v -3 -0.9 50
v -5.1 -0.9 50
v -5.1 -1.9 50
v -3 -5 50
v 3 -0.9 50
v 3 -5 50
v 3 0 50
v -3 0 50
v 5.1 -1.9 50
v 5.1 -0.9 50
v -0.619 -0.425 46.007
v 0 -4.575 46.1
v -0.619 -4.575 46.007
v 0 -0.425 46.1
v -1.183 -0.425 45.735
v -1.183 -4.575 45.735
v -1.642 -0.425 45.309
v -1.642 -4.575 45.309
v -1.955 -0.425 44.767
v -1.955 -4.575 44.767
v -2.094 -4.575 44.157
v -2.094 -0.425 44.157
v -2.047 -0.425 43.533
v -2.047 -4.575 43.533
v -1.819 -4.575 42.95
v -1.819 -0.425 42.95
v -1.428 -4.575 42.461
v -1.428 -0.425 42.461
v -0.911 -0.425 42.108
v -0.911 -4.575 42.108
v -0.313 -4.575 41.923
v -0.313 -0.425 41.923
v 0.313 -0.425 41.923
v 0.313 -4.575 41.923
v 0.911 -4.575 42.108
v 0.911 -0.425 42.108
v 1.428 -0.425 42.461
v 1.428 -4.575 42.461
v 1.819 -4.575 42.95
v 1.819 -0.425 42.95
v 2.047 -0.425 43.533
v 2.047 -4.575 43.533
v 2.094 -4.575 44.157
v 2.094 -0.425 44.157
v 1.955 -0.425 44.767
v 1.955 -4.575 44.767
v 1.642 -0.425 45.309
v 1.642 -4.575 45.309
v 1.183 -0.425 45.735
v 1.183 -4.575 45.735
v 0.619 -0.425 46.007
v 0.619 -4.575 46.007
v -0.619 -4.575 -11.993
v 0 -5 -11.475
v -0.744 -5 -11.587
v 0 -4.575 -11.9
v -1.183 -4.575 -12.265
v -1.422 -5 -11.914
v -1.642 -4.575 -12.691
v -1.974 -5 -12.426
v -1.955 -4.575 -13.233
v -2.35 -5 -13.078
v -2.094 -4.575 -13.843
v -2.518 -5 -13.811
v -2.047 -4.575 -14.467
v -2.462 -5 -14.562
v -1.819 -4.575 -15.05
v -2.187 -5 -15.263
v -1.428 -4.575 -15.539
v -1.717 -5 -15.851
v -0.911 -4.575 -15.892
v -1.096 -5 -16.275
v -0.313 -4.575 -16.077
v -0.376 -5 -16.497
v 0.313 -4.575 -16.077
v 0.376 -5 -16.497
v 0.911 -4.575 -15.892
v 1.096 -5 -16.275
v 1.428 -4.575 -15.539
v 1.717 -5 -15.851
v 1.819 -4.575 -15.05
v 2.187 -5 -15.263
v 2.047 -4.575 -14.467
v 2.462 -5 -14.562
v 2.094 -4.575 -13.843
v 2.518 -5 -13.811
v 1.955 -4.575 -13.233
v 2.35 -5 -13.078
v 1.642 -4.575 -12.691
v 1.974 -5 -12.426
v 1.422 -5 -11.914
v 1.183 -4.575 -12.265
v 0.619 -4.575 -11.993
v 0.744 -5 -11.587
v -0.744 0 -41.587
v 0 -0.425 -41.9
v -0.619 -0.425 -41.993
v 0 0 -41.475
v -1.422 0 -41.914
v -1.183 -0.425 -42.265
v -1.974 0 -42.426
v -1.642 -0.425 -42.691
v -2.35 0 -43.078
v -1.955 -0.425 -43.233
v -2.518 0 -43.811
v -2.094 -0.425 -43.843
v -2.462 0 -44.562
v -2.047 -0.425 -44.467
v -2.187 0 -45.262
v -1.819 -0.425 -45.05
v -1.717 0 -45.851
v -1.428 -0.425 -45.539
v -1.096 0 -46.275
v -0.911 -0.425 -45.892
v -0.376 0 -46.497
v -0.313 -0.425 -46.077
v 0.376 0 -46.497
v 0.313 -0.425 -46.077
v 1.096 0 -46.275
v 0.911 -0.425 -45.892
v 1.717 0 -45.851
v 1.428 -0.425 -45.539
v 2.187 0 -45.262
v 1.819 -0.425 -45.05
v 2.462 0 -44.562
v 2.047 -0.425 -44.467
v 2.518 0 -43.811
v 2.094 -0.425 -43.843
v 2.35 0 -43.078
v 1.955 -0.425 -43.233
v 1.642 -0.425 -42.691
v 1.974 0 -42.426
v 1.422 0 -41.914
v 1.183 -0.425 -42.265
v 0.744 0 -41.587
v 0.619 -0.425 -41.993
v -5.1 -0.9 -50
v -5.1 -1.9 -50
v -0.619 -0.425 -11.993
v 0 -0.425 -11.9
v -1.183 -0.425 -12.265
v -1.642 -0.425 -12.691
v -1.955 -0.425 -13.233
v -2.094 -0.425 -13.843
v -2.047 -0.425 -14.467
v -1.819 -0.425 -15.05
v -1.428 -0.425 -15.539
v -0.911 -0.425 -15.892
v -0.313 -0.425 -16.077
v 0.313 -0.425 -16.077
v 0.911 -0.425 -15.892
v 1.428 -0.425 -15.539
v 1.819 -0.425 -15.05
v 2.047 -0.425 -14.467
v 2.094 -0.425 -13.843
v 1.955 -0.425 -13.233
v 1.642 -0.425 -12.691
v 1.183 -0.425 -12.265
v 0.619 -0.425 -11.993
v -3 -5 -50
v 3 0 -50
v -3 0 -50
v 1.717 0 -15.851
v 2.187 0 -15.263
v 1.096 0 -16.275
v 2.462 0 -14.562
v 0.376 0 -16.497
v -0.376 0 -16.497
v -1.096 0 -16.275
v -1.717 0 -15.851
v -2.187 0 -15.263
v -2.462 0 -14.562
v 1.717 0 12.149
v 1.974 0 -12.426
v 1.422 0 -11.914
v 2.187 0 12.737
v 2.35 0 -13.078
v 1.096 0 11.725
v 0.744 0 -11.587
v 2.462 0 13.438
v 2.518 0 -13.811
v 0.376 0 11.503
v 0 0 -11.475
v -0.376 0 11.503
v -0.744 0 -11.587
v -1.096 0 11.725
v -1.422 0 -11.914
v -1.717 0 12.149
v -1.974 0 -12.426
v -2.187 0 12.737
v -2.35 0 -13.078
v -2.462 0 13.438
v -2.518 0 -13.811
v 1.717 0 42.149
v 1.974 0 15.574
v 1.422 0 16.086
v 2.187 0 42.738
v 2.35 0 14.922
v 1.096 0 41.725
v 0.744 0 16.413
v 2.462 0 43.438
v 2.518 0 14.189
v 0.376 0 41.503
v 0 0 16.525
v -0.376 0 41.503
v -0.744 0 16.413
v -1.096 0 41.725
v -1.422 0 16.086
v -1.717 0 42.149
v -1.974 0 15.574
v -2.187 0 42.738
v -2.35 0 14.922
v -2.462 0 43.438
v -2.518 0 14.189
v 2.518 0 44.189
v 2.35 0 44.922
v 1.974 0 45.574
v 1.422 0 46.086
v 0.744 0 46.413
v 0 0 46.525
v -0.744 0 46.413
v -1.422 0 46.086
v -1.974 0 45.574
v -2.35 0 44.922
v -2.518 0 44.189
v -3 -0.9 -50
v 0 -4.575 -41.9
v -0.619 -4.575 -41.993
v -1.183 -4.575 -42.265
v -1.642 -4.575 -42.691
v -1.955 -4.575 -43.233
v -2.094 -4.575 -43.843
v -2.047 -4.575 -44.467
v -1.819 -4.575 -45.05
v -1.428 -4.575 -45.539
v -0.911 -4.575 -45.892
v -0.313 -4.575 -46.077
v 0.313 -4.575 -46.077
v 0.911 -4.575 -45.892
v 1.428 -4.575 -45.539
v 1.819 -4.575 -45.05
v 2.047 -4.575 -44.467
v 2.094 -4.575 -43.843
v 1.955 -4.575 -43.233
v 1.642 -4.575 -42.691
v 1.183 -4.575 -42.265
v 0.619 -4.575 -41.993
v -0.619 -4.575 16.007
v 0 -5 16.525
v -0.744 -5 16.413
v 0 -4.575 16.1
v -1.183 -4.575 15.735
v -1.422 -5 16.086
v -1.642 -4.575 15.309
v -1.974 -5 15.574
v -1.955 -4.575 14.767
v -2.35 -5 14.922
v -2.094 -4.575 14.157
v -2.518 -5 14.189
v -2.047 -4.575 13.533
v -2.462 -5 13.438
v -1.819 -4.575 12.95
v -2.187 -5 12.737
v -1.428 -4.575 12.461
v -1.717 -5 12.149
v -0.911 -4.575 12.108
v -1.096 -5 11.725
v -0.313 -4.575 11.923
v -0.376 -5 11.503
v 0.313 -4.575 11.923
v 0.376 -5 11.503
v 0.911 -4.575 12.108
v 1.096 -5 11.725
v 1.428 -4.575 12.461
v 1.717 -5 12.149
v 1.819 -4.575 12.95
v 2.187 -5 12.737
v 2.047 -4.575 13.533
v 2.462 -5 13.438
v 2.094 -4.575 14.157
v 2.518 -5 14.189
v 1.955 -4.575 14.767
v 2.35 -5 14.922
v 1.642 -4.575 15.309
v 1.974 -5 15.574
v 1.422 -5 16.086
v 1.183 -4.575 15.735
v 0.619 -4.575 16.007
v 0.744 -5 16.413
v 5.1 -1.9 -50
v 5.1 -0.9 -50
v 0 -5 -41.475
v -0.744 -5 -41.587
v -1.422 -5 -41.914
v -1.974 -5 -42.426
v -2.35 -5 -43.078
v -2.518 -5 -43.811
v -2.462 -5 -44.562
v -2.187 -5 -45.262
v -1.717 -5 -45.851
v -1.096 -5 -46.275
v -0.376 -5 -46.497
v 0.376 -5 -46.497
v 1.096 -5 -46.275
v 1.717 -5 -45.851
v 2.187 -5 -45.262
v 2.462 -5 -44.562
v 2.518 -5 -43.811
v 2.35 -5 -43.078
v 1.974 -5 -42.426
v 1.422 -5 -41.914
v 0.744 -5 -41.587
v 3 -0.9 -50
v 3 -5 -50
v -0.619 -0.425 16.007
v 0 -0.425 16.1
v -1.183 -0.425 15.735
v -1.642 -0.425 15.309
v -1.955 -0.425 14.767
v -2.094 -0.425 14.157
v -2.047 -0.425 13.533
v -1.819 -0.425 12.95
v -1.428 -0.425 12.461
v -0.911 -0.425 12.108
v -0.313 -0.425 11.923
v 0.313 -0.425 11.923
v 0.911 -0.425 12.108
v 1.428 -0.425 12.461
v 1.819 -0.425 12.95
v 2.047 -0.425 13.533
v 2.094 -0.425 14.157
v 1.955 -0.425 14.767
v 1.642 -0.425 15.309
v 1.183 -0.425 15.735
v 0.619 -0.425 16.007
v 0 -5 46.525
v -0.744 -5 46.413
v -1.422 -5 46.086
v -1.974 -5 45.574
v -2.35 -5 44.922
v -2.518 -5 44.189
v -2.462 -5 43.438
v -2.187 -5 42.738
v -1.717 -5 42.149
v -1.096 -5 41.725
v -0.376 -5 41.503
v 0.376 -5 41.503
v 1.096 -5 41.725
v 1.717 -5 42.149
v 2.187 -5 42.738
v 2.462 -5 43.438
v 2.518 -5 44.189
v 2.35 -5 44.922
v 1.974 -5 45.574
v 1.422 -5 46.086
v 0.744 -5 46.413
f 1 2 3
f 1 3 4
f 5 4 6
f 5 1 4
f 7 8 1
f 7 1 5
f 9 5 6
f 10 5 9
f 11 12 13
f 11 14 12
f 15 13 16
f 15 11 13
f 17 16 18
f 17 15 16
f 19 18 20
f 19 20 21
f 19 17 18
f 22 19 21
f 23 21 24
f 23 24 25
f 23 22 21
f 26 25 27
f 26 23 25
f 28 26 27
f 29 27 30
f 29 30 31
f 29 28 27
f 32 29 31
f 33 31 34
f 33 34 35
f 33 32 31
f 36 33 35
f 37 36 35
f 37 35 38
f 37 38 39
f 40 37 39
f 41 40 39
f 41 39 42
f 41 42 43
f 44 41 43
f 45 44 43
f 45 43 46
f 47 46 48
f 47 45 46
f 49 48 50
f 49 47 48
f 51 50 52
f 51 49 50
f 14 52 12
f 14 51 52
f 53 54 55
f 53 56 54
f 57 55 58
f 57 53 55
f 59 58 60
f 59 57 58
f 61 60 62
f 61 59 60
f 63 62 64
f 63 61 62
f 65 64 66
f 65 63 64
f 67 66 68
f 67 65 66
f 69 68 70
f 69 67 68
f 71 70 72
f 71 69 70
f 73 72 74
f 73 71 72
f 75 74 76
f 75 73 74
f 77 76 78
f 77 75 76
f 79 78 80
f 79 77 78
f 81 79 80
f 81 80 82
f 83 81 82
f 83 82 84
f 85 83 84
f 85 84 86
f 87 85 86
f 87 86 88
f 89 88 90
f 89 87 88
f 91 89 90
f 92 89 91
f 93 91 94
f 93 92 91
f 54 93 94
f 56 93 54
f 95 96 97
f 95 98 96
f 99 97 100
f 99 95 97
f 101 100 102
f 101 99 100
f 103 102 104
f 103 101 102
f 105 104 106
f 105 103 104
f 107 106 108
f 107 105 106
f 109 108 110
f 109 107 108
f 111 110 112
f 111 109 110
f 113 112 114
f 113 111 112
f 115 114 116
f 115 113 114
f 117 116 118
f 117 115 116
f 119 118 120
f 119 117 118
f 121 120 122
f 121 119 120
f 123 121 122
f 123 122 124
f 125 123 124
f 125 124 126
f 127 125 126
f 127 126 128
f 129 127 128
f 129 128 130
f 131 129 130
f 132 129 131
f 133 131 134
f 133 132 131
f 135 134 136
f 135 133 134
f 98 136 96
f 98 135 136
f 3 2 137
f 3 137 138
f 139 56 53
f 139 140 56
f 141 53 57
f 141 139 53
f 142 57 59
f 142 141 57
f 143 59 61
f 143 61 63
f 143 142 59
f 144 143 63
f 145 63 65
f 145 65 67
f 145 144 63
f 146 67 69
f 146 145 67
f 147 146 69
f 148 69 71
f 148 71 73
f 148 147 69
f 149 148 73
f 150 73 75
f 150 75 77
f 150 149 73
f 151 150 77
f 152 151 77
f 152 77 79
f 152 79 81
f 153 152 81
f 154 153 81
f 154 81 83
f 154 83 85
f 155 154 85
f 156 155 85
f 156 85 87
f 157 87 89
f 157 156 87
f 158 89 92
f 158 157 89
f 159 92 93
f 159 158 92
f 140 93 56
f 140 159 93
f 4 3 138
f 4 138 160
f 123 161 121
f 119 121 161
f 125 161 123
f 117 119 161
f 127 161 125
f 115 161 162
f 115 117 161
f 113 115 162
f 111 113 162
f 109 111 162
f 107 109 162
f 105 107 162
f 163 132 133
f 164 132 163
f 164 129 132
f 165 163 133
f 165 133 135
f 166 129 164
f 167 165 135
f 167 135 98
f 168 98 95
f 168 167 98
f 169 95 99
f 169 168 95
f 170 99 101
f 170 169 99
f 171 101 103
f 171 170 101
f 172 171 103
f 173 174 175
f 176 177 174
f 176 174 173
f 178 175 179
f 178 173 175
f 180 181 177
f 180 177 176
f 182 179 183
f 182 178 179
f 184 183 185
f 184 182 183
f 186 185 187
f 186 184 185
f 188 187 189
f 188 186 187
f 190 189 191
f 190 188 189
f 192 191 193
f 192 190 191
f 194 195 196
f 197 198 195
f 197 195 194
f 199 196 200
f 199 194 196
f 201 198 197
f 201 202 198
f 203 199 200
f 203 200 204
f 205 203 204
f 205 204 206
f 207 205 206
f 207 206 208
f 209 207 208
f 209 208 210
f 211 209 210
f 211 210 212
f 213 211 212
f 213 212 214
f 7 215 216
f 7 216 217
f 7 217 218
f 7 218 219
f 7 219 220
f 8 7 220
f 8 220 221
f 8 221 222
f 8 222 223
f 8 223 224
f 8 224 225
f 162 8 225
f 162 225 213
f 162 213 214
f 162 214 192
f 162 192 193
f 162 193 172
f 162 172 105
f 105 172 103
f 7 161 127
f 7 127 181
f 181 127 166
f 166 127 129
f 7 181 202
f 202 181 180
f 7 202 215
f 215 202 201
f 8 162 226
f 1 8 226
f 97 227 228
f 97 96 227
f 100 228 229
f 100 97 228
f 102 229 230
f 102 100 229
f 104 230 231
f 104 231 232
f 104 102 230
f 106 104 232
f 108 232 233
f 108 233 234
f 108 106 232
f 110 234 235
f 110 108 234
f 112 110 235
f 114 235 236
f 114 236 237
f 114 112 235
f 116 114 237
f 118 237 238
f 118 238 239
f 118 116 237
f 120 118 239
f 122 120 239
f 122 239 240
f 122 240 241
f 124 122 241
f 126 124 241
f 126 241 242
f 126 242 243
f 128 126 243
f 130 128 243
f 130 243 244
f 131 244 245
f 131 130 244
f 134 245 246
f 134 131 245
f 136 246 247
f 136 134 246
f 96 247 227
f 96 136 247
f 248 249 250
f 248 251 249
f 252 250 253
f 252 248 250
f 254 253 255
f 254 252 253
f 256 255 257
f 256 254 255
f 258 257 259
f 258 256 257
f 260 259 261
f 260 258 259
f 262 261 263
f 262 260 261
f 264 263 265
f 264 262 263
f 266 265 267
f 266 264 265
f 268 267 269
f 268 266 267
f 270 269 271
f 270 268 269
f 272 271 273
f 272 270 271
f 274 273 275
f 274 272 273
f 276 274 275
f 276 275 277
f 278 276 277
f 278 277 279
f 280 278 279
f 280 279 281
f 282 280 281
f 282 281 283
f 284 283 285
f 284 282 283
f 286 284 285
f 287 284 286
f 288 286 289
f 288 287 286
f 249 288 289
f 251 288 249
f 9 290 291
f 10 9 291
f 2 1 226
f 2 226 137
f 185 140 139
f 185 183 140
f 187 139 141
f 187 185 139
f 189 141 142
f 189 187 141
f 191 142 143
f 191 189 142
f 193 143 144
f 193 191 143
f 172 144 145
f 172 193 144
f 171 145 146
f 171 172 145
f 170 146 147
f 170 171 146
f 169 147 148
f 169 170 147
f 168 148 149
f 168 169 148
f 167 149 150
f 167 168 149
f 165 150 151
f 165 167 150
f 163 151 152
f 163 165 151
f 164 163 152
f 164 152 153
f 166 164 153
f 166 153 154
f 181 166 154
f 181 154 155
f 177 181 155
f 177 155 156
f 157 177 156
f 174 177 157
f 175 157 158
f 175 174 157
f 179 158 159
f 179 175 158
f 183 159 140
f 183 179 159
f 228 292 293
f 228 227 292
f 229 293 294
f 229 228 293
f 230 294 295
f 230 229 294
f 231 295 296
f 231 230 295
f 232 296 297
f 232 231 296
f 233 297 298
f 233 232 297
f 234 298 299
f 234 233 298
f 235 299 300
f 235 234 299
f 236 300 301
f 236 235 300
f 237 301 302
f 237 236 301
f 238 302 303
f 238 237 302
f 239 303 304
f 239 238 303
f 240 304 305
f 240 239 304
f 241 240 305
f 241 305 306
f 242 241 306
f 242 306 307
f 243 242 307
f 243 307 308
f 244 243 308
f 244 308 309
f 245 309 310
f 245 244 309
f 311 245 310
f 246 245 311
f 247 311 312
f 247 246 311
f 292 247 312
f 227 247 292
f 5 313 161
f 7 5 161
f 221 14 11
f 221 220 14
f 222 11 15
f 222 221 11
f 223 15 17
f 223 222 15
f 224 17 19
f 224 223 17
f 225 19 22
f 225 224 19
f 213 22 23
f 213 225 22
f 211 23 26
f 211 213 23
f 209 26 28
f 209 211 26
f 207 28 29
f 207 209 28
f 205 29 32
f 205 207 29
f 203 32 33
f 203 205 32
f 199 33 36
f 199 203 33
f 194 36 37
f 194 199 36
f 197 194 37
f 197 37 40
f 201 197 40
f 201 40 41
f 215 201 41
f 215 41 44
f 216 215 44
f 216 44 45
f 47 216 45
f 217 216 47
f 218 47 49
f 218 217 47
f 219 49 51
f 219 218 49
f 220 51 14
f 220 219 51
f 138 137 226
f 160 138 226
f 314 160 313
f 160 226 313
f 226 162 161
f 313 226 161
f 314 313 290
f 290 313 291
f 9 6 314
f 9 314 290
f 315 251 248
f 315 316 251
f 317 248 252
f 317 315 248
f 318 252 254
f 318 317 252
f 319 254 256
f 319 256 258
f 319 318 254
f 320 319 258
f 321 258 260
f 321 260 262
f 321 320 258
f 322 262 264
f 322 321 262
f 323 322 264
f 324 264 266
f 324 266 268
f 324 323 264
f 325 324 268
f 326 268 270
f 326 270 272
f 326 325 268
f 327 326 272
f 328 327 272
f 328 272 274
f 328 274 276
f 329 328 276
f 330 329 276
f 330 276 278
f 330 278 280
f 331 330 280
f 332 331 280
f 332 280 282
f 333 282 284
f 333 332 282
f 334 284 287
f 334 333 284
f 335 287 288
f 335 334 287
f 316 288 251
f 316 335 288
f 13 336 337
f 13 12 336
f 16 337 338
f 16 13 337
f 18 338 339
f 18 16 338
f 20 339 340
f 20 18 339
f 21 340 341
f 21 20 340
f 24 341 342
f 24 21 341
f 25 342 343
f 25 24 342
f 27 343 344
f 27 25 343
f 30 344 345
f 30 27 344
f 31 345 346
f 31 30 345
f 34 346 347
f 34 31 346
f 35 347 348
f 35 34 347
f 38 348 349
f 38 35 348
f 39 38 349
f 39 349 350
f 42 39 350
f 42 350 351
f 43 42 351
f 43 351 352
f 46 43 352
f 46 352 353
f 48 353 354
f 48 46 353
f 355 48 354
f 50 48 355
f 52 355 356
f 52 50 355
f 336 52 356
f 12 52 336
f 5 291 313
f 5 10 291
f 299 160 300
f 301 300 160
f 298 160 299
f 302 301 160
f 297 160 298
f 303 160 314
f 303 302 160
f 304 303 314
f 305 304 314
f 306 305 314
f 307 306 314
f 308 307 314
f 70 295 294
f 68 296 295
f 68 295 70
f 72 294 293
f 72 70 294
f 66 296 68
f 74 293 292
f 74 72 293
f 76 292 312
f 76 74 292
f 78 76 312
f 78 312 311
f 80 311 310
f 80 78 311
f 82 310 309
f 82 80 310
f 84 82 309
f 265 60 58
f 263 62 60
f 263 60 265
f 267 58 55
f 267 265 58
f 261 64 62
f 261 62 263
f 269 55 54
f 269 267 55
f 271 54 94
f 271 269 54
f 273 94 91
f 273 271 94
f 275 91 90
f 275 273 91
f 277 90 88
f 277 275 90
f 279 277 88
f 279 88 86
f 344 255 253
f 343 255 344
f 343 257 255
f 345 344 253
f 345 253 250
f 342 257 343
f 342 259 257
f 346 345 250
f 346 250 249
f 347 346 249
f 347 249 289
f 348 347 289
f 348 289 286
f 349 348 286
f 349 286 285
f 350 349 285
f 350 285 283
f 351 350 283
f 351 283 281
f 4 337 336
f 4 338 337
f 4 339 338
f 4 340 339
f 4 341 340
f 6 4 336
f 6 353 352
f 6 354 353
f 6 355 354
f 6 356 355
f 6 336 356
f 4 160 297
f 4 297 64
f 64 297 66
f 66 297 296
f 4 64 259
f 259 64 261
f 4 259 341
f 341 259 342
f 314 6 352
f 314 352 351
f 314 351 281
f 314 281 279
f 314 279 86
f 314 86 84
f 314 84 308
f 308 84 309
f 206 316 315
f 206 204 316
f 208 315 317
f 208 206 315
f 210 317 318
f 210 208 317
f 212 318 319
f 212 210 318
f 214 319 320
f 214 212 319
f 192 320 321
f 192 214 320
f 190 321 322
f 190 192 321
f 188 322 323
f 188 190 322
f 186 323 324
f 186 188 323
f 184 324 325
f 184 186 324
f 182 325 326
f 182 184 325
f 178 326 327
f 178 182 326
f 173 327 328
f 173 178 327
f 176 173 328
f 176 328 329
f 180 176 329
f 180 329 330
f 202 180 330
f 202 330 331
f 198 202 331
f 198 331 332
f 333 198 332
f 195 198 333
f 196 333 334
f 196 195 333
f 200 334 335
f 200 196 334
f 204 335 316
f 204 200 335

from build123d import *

# Parameters (mm, degrees)
EXTRUDE_1_DEPTH            = 50
HOLE_WIZARD_M51_AT_2_COUNT = 2
HOLE_WIZARD_M51_AT_2_PITCH = 30
HOLE_WIZARD_M51_AT_3_COUNT = 2
HOLE_WIZARD_M51_AT_3_PITCH = 58
HOLE_WIZARD_M51_AT_4_COUNT = 2
HOLE_WIZARD_M51_AT_4_PITCH = 88


with BuildPart() as part:
    # Эскиз1 → Бобышка-Вытянуть1 (new body, symmetric)
    with BuildSketch(Plane.XY):
        Polygon((3, 0), (-3, 0), (-3, -0.9), (-5.1, -0.9), (-5.1, -1.9), (-3, -5), (3, -5), (5.1, -1.9), (5.1, -0.9), (3, -0.9), align=None)
    extrude(amount=EXTRUDE_1_DEPTH, both=True)

    # Эскиз4 → Отверстие обработанное метчиком M51 (revolve, cut)
    with BuildSketch(Plane(origin=(0, 0, -44), x_dir=(0, 0, 1), z_dir=(1, 0, 0))):
        Polygon((0, 0), (0, 5), (2.525, 5), (2.1, 4.575), (2.1, 0.425), (2.525, 0), align=None)
    hole_wizard_m51 = revolve(axis=Axis((0, 6.35, -44), (0, -1, 0)), mode=Mode.SUBTRACT)

    # Отверстие обработанное метчиком M51 at 2: Отверстие обработанное метчиком M51 ×2
    with Locations(*[(0, 0, i * HOLE_WIZARD_M51_AT_2_PITCH) for i in range(1, HOLE_WIZARD_M51_AT_2_COUNT)]):
        add(hole_wizard_m51, mode=Mode.SUBTRACT)

    # Отверстие обработанное метчиком M51 at 3: Отверстие обработанное метчиком M51 ×2
    with Locations(*[(0, 0, i * HOLE_WIZARD_M51_AT_3_PITCH) for i in range(1, HOLE_WIZARD_M51_AT_3_COUNT)]):
        add(hole_wizard_m51, mode=Mode.SUBTRACT)

    # Отверстие обработанное метчиком M51 at 4: Отверстие обработанное метчиком M51 ×2
    with Locations(*[(0, 0, i * HOLE_WIZARD_M51_AT_4_PITCH) for i in range(1, HOLE_WIZARD_M51_AT_4_COUNT)]):
        add(hole_wizard_m51, mode=Mode.SUBTRACT)


solid = part.part
